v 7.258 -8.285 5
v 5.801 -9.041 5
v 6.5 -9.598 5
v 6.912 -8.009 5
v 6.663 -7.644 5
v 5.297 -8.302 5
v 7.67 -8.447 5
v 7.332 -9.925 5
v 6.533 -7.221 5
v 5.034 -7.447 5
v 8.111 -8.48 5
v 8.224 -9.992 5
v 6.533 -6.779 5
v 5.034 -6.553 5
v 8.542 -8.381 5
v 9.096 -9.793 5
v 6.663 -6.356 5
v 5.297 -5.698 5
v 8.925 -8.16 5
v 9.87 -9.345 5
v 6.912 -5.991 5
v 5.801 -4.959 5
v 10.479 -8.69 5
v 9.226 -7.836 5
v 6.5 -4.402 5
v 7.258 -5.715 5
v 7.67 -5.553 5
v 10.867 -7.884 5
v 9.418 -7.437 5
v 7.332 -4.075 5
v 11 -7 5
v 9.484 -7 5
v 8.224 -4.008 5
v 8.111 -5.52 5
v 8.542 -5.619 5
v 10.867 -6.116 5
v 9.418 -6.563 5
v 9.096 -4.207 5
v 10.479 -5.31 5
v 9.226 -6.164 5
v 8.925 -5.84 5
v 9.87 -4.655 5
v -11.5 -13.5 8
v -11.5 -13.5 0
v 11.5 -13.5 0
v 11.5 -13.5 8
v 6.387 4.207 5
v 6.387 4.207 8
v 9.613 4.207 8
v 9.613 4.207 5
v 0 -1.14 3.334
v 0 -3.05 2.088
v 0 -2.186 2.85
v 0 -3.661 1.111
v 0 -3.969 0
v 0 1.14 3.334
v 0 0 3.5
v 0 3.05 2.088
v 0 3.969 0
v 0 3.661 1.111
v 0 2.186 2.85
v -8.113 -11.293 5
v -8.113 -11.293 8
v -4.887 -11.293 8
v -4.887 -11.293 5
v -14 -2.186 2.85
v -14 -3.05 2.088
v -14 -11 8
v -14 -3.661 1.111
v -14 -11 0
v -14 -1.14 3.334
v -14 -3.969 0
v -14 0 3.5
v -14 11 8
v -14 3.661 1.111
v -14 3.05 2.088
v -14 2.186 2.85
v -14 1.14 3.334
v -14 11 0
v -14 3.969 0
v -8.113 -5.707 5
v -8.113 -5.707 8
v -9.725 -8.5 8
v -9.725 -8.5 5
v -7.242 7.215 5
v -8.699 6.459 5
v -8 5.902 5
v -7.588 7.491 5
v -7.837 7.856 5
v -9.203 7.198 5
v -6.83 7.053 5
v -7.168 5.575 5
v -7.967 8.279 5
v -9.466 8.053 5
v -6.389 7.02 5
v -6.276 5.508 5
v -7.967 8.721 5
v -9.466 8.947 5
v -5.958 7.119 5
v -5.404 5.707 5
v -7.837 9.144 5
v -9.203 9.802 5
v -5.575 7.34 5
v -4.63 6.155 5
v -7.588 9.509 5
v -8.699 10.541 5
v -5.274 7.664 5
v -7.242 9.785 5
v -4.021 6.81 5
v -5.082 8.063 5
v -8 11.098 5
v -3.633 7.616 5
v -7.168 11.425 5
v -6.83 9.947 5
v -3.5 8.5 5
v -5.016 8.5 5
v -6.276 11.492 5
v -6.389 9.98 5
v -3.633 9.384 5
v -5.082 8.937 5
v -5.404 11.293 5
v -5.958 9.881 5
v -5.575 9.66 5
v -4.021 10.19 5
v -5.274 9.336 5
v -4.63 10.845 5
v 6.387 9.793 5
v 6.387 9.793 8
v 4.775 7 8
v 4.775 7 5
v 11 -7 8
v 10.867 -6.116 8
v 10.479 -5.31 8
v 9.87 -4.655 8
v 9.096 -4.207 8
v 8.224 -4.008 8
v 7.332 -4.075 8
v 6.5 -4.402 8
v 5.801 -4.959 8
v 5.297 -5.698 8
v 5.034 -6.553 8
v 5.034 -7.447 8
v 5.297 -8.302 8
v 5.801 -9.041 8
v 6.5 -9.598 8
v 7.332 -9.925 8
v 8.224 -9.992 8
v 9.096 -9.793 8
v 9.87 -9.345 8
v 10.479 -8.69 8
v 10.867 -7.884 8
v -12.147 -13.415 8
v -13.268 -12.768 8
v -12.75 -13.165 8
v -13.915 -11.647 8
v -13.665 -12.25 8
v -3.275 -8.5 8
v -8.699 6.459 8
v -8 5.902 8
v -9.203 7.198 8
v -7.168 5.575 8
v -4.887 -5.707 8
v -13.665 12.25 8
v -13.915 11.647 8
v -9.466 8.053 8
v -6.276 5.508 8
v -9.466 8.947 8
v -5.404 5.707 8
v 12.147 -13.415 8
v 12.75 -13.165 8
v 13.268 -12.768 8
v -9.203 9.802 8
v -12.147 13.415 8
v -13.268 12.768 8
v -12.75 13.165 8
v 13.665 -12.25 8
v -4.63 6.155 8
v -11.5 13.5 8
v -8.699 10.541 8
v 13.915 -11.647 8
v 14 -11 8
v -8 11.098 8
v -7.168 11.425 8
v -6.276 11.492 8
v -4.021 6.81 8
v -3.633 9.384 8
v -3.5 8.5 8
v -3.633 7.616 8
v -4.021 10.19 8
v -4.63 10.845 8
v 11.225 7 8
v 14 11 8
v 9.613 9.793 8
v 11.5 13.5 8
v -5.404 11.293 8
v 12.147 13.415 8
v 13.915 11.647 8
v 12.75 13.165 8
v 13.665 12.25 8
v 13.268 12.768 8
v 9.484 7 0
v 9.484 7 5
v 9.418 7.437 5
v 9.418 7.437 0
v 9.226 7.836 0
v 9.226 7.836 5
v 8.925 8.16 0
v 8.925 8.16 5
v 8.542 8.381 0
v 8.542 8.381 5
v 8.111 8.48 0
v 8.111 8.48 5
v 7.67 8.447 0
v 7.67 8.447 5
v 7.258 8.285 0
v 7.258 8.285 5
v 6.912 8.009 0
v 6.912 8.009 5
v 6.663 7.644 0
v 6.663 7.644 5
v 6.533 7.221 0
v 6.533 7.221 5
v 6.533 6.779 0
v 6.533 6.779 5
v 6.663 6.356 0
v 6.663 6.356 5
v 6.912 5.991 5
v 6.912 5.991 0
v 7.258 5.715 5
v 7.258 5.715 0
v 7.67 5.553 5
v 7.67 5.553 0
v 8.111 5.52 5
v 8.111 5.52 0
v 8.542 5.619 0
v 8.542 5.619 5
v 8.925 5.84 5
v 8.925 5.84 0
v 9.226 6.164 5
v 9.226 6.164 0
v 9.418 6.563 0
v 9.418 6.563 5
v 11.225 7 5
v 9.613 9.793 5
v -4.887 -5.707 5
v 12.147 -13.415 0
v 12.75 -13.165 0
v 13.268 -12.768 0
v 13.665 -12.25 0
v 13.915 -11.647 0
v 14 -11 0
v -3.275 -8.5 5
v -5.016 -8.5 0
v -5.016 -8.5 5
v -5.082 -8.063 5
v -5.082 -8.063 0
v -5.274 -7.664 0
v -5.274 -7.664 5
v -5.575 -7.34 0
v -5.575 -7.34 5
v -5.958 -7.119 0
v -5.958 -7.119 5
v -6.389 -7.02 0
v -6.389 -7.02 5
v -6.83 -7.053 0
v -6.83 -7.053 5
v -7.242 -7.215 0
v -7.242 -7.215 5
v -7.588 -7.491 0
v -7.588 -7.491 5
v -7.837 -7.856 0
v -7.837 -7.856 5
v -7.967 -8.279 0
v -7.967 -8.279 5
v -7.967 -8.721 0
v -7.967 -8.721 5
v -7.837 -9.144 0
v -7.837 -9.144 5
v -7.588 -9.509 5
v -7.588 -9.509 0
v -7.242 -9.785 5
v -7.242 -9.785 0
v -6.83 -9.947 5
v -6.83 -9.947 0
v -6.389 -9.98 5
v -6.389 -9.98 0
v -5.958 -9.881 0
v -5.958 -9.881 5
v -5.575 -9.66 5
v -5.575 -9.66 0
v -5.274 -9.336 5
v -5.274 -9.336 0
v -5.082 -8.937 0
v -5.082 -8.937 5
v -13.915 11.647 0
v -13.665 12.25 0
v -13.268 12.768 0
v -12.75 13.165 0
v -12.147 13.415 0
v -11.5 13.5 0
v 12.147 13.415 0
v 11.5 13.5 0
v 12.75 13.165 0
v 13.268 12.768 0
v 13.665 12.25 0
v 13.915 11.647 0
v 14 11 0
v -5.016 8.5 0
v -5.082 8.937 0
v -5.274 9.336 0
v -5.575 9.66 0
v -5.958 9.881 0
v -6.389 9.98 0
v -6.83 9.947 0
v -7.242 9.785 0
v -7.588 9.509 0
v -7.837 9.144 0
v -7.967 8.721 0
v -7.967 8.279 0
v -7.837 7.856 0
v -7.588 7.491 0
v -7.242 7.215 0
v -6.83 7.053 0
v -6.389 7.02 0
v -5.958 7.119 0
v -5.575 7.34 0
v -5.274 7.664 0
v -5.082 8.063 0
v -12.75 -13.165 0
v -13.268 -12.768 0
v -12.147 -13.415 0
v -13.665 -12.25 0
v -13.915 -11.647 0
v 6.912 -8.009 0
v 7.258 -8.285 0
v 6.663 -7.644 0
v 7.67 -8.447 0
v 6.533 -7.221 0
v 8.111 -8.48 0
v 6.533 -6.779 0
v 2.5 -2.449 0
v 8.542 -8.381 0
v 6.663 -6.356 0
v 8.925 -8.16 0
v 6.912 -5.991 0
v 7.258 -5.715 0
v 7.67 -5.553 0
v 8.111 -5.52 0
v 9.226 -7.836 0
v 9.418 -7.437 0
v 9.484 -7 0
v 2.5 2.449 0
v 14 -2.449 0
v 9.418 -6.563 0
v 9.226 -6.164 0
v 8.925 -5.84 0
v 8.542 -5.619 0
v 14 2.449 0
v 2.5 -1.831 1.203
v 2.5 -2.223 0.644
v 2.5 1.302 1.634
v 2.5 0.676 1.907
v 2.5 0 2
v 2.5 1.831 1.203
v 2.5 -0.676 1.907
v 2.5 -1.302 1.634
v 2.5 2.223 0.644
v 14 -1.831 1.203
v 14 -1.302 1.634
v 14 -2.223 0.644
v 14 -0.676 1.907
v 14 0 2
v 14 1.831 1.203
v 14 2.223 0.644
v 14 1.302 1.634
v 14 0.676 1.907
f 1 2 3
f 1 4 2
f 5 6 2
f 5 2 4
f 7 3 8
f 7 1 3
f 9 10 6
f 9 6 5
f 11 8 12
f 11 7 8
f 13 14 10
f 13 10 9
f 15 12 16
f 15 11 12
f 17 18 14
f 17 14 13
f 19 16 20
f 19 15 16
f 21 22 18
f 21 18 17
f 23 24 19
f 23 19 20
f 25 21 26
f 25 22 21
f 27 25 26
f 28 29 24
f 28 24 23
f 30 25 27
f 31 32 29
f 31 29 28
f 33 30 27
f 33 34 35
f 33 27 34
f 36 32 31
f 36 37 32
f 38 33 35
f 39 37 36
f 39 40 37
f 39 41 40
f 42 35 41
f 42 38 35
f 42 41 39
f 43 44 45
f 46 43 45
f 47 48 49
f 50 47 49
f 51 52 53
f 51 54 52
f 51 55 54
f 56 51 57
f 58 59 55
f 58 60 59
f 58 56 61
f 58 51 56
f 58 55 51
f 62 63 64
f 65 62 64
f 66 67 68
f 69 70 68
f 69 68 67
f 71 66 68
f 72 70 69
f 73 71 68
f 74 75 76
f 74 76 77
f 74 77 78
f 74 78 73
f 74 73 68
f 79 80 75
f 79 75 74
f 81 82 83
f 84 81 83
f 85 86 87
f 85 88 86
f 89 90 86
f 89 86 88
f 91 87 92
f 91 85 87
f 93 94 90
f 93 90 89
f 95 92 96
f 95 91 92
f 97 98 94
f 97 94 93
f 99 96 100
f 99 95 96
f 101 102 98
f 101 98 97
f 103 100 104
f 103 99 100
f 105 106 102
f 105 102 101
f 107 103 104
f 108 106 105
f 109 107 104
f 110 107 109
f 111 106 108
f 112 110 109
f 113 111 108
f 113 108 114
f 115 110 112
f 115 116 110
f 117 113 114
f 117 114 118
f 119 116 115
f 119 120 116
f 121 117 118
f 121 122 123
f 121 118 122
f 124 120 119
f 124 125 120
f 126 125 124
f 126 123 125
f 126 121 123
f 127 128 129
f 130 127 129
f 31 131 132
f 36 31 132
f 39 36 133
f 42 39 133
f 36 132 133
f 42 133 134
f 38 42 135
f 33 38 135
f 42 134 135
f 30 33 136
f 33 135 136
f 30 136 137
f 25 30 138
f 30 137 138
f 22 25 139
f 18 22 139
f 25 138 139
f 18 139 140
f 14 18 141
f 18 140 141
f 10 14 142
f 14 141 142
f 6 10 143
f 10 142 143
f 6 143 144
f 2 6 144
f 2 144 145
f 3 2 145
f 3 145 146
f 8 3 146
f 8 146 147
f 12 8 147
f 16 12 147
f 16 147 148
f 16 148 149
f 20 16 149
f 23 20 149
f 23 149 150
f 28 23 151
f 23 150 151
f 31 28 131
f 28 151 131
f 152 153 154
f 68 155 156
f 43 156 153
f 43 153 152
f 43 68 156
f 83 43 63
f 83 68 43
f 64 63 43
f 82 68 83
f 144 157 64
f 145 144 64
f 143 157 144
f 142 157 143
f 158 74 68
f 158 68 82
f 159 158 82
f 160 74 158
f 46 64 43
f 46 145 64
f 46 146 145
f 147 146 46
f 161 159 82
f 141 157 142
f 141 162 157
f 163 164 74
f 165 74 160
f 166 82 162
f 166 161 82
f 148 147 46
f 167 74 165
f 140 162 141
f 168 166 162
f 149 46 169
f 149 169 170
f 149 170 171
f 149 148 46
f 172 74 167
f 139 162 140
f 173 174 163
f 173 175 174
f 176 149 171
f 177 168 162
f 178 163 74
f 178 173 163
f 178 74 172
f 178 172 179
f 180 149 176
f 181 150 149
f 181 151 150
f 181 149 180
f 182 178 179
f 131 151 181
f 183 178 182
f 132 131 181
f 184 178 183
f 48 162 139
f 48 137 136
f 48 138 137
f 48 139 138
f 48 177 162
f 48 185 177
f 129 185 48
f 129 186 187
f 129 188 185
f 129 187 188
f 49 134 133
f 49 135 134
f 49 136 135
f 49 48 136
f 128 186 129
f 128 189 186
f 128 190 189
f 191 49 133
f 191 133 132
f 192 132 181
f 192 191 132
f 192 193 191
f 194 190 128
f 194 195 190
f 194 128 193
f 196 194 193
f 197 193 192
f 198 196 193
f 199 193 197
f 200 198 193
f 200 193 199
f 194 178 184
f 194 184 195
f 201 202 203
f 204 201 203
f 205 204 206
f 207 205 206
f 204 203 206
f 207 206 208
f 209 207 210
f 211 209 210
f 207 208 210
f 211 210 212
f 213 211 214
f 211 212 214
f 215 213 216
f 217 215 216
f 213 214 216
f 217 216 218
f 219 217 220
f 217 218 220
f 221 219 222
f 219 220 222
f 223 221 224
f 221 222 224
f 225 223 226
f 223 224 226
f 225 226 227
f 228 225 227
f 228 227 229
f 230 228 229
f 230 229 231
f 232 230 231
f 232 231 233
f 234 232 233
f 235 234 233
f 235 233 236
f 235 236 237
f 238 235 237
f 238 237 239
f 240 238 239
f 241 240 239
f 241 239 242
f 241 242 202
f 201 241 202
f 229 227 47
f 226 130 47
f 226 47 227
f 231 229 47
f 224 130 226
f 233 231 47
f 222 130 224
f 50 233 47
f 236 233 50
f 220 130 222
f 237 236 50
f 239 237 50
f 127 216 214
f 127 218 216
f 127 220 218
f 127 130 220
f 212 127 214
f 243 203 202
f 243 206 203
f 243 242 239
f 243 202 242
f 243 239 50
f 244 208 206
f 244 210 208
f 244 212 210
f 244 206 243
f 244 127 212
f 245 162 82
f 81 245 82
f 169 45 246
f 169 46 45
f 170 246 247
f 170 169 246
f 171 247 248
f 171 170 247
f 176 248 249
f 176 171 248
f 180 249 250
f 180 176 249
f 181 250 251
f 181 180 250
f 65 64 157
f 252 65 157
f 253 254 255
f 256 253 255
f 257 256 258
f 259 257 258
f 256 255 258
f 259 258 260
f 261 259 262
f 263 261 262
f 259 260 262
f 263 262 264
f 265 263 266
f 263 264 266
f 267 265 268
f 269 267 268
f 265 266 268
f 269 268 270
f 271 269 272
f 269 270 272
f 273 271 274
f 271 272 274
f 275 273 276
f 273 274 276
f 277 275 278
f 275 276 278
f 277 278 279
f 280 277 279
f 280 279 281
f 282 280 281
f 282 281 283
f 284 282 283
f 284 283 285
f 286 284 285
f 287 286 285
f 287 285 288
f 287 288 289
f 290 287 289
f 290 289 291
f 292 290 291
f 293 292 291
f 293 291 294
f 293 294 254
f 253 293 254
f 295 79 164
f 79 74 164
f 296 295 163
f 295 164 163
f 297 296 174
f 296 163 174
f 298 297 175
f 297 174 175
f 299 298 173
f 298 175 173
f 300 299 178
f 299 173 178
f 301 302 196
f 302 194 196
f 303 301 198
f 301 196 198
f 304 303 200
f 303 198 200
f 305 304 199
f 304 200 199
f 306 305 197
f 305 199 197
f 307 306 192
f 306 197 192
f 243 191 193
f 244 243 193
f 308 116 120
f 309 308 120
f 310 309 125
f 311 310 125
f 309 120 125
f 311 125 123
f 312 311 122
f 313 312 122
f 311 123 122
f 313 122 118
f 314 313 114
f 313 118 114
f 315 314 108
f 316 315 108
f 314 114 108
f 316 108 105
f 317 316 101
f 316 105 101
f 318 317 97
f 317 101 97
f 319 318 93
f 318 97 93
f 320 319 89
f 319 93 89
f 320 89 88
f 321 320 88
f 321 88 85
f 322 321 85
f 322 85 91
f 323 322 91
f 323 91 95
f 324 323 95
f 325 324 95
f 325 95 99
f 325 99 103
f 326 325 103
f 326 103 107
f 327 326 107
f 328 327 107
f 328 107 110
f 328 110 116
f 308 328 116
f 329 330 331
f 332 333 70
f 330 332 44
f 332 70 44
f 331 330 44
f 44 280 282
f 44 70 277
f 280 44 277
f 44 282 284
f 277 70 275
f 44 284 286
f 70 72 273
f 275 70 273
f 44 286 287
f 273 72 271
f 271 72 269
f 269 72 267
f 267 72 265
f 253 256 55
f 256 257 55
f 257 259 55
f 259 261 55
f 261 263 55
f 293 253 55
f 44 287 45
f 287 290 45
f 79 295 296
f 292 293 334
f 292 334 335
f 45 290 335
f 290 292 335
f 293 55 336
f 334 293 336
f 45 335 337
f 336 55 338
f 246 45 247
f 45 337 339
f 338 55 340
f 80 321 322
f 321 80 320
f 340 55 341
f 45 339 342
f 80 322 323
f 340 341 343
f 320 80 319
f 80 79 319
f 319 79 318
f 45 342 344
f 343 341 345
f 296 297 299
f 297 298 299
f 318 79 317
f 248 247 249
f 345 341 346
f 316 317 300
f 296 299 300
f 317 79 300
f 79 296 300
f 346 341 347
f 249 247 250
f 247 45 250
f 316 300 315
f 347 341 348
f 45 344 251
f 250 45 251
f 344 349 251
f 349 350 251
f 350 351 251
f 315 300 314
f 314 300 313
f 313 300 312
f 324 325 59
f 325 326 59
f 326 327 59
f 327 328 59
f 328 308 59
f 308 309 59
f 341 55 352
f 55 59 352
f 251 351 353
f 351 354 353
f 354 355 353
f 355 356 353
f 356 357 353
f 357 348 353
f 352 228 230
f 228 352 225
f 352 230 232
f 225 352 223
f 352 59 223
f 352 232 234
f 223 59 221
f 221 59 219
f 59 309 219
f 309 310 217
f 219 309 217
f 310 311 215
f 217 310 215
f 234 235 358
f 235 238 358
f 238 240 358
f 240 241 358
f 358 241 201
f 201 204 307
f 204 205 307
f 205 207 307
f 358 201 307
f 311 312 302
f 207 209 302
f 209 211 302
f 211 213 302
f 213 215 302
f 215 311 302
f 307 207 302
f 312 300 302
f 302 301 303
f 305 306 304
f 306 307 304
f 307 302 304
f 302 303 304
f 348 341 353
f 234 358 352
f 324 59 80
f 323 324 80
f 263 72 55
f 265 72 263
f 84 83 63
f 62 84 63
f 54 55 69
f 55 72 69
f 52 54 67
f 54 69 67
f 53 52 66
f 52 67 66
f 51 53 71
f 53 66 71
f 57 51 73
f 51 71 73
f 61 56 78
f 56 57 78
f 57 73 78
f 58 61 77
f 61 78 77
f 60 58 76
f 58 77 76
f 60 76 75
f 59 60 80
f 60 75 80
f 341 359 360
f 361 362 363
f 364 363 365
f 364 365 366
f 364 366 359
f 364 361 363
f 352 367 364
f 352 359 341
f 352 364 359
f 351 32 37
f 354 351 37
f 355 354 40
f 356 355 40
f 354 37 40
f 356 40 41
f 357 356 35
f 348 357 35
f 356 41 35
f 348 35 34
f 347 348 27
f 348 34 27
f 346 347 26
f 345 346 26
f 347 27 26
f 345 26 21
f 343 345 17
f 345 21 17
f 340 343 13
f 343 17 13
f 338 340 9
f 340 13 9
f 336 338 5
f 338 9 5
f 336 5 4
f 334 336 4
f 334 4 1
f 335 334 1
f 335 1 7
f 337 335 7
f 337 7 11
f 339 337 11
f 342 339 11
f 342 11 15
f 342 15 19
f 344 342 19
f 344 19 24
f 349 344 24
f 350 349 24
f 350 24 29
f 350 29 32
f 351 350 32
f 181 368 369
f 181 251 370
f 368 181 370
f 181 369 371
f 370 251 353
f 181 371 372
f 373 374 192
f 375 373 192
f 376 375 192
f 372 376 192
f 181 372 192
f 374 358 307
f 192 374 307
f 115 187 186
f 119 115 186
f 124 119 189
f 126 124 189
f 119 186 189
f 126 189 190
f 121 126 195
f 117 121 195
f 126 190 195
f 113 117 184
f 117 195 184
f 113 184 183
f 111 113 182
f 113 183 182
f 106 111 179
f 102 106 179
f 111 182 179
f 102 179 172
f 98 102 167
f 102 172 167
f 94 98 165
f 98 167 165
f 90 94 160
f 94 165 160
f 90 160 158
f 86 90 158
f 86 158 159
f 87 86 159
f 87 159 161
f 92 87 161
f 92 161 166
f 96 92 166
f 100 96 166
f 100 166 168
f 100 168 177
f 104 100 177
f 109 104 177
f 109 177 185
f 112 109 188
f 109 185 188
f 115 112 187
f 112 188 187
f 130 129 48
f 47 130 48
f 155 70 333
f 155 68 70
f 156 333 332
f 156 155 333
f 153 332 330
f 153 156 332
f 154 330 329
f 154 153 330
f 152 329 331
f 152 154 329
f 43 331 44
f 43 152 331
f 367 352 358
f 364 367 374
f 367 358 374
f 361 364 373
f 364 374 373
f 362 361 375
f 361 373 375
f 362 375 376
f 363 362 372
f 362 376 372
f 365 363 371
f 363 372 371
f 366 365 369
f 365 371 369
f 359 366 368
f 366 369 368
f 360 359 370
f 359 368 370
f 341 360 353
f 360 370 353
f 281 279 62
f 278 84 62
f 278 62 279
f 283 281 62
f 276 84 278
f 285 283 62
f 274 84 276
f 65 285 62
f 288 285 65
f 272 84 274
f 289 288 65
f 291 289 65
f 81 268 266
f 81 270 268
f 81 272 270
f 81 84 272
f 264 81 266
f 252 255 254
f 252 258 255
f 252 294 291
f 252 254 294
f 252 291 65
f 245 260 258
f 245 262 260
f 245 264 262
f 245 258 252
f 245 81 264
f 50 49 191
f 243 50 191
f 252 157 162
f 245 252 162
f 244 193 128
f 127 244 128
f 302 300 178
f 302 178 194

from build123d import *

# Parameters (mm, degrees)
SKETCH1_W           = 28
SKETCH1_H           = 27
BOSS_EXTRUDE1_DEPTH = 8
SKETCH2_R           = 1.48371595
CUT_EXTRUDE1_DEPTH  = 22.029740845
SKETCH3_R           = 3
CUT_EXTRUDE2_DEPTH  = 3
FILLET1_R           = 2.5
SKETCH4_R           = 2.5
CUT_EXTRUDE3_DEPTH  = 11.5
SKETCH5_R           = 4
CUT_EXTRUDE4_DEPTH  = 14


with BuildPart() as part:
    # Sketch1 → Boss-Extrude1 (new body)
    with BuildSketch(Plane.XY):
        Rectangle(SKETCH1_W, SKETCH1_H)
    extrude(amount=BOSS_EXTRUDE1_DEPTH)

    # Sketch2 → Cut-Extrude1 (cut, through all)
    with BuildSketch(Plane.XY.offset(8)):
        with Locations((-6.5, 8.5)):
            Circle(SKETCH2_R)
        with Locations((-6.5, -8.5)):
            Circle(SKETCH2_R)
        with Locations((8, -7)):
            Circle(SKETCH2_R)
        with Locations((8, 7)):
            Circle(SKETCH2_R)
    extrude(amount=-CUT_EXTRUDE1_DEPTH, mode=Mode.SUBTRACT)

    # Sketch3 → Cut-Extrude2 (cut)
    with BuildSketch(Plane.XY.offset(8)):
        with Locations((-6.5, 8.5)):
            Circle(SKETCH3_R)
        with Locations((8, -7)):
            Circle(SKETCH3_R)
        Polygon((-8.112712507, -11.2933), (-4.887287493, -11.2933), (-3.274574986, -8.5), (-4.887287493, -5.7067), (-8.112712507, -5.7067), (-9.725425014, -8.5), align=None)
        Polygon((6.387287493, 4.2067), (9.612712507, 4.2067), (11.225425014, 7), (9.612712507, 9.7933), (6.387287493, 9.7933), (4.774574986, 7), align=None)
    extrude(amount=-CUT_EXTRUDE2_DEPTH, mode=Mode.SUBTRACT)

    # Fillet1
    fillet1_edges = [part.edges().sort_by_distance(p)[0] for p in [
        (-14, 13.5, 4),
        (14, 13.5, 4),
        (14, -13.5, 4),
        (-14, -13.5, 4),
    ]]
    fillet(fillet1_edges, radius=FILLET1_R)

    # Sketch4 → Cut-Extrude3 (cut)
    with BuildSketch(Plane(origin=(14, 0, 0), x_dir=(0, 0, -1), z_dir=(1, 0, 0))):
        with Locations((0.5, 0)):
            Circle(SKETCH4_R)
    extrude(amount=-CUT_EXTRUDE3_DEPTH, mode=Mode.SUBTRACT)

    # Sketch5 → Cut-Extrude4 (cut)
    with BuildSketch(Plane.ZY.offset(14)):
        with Locations((-0.5, 0)):
            Circle(SKETCH5_R)
    extrude(amount=-CUT_EXTRUDE4_DEPTH, mode=Mode.SUBTRACT)


solid = part.part
